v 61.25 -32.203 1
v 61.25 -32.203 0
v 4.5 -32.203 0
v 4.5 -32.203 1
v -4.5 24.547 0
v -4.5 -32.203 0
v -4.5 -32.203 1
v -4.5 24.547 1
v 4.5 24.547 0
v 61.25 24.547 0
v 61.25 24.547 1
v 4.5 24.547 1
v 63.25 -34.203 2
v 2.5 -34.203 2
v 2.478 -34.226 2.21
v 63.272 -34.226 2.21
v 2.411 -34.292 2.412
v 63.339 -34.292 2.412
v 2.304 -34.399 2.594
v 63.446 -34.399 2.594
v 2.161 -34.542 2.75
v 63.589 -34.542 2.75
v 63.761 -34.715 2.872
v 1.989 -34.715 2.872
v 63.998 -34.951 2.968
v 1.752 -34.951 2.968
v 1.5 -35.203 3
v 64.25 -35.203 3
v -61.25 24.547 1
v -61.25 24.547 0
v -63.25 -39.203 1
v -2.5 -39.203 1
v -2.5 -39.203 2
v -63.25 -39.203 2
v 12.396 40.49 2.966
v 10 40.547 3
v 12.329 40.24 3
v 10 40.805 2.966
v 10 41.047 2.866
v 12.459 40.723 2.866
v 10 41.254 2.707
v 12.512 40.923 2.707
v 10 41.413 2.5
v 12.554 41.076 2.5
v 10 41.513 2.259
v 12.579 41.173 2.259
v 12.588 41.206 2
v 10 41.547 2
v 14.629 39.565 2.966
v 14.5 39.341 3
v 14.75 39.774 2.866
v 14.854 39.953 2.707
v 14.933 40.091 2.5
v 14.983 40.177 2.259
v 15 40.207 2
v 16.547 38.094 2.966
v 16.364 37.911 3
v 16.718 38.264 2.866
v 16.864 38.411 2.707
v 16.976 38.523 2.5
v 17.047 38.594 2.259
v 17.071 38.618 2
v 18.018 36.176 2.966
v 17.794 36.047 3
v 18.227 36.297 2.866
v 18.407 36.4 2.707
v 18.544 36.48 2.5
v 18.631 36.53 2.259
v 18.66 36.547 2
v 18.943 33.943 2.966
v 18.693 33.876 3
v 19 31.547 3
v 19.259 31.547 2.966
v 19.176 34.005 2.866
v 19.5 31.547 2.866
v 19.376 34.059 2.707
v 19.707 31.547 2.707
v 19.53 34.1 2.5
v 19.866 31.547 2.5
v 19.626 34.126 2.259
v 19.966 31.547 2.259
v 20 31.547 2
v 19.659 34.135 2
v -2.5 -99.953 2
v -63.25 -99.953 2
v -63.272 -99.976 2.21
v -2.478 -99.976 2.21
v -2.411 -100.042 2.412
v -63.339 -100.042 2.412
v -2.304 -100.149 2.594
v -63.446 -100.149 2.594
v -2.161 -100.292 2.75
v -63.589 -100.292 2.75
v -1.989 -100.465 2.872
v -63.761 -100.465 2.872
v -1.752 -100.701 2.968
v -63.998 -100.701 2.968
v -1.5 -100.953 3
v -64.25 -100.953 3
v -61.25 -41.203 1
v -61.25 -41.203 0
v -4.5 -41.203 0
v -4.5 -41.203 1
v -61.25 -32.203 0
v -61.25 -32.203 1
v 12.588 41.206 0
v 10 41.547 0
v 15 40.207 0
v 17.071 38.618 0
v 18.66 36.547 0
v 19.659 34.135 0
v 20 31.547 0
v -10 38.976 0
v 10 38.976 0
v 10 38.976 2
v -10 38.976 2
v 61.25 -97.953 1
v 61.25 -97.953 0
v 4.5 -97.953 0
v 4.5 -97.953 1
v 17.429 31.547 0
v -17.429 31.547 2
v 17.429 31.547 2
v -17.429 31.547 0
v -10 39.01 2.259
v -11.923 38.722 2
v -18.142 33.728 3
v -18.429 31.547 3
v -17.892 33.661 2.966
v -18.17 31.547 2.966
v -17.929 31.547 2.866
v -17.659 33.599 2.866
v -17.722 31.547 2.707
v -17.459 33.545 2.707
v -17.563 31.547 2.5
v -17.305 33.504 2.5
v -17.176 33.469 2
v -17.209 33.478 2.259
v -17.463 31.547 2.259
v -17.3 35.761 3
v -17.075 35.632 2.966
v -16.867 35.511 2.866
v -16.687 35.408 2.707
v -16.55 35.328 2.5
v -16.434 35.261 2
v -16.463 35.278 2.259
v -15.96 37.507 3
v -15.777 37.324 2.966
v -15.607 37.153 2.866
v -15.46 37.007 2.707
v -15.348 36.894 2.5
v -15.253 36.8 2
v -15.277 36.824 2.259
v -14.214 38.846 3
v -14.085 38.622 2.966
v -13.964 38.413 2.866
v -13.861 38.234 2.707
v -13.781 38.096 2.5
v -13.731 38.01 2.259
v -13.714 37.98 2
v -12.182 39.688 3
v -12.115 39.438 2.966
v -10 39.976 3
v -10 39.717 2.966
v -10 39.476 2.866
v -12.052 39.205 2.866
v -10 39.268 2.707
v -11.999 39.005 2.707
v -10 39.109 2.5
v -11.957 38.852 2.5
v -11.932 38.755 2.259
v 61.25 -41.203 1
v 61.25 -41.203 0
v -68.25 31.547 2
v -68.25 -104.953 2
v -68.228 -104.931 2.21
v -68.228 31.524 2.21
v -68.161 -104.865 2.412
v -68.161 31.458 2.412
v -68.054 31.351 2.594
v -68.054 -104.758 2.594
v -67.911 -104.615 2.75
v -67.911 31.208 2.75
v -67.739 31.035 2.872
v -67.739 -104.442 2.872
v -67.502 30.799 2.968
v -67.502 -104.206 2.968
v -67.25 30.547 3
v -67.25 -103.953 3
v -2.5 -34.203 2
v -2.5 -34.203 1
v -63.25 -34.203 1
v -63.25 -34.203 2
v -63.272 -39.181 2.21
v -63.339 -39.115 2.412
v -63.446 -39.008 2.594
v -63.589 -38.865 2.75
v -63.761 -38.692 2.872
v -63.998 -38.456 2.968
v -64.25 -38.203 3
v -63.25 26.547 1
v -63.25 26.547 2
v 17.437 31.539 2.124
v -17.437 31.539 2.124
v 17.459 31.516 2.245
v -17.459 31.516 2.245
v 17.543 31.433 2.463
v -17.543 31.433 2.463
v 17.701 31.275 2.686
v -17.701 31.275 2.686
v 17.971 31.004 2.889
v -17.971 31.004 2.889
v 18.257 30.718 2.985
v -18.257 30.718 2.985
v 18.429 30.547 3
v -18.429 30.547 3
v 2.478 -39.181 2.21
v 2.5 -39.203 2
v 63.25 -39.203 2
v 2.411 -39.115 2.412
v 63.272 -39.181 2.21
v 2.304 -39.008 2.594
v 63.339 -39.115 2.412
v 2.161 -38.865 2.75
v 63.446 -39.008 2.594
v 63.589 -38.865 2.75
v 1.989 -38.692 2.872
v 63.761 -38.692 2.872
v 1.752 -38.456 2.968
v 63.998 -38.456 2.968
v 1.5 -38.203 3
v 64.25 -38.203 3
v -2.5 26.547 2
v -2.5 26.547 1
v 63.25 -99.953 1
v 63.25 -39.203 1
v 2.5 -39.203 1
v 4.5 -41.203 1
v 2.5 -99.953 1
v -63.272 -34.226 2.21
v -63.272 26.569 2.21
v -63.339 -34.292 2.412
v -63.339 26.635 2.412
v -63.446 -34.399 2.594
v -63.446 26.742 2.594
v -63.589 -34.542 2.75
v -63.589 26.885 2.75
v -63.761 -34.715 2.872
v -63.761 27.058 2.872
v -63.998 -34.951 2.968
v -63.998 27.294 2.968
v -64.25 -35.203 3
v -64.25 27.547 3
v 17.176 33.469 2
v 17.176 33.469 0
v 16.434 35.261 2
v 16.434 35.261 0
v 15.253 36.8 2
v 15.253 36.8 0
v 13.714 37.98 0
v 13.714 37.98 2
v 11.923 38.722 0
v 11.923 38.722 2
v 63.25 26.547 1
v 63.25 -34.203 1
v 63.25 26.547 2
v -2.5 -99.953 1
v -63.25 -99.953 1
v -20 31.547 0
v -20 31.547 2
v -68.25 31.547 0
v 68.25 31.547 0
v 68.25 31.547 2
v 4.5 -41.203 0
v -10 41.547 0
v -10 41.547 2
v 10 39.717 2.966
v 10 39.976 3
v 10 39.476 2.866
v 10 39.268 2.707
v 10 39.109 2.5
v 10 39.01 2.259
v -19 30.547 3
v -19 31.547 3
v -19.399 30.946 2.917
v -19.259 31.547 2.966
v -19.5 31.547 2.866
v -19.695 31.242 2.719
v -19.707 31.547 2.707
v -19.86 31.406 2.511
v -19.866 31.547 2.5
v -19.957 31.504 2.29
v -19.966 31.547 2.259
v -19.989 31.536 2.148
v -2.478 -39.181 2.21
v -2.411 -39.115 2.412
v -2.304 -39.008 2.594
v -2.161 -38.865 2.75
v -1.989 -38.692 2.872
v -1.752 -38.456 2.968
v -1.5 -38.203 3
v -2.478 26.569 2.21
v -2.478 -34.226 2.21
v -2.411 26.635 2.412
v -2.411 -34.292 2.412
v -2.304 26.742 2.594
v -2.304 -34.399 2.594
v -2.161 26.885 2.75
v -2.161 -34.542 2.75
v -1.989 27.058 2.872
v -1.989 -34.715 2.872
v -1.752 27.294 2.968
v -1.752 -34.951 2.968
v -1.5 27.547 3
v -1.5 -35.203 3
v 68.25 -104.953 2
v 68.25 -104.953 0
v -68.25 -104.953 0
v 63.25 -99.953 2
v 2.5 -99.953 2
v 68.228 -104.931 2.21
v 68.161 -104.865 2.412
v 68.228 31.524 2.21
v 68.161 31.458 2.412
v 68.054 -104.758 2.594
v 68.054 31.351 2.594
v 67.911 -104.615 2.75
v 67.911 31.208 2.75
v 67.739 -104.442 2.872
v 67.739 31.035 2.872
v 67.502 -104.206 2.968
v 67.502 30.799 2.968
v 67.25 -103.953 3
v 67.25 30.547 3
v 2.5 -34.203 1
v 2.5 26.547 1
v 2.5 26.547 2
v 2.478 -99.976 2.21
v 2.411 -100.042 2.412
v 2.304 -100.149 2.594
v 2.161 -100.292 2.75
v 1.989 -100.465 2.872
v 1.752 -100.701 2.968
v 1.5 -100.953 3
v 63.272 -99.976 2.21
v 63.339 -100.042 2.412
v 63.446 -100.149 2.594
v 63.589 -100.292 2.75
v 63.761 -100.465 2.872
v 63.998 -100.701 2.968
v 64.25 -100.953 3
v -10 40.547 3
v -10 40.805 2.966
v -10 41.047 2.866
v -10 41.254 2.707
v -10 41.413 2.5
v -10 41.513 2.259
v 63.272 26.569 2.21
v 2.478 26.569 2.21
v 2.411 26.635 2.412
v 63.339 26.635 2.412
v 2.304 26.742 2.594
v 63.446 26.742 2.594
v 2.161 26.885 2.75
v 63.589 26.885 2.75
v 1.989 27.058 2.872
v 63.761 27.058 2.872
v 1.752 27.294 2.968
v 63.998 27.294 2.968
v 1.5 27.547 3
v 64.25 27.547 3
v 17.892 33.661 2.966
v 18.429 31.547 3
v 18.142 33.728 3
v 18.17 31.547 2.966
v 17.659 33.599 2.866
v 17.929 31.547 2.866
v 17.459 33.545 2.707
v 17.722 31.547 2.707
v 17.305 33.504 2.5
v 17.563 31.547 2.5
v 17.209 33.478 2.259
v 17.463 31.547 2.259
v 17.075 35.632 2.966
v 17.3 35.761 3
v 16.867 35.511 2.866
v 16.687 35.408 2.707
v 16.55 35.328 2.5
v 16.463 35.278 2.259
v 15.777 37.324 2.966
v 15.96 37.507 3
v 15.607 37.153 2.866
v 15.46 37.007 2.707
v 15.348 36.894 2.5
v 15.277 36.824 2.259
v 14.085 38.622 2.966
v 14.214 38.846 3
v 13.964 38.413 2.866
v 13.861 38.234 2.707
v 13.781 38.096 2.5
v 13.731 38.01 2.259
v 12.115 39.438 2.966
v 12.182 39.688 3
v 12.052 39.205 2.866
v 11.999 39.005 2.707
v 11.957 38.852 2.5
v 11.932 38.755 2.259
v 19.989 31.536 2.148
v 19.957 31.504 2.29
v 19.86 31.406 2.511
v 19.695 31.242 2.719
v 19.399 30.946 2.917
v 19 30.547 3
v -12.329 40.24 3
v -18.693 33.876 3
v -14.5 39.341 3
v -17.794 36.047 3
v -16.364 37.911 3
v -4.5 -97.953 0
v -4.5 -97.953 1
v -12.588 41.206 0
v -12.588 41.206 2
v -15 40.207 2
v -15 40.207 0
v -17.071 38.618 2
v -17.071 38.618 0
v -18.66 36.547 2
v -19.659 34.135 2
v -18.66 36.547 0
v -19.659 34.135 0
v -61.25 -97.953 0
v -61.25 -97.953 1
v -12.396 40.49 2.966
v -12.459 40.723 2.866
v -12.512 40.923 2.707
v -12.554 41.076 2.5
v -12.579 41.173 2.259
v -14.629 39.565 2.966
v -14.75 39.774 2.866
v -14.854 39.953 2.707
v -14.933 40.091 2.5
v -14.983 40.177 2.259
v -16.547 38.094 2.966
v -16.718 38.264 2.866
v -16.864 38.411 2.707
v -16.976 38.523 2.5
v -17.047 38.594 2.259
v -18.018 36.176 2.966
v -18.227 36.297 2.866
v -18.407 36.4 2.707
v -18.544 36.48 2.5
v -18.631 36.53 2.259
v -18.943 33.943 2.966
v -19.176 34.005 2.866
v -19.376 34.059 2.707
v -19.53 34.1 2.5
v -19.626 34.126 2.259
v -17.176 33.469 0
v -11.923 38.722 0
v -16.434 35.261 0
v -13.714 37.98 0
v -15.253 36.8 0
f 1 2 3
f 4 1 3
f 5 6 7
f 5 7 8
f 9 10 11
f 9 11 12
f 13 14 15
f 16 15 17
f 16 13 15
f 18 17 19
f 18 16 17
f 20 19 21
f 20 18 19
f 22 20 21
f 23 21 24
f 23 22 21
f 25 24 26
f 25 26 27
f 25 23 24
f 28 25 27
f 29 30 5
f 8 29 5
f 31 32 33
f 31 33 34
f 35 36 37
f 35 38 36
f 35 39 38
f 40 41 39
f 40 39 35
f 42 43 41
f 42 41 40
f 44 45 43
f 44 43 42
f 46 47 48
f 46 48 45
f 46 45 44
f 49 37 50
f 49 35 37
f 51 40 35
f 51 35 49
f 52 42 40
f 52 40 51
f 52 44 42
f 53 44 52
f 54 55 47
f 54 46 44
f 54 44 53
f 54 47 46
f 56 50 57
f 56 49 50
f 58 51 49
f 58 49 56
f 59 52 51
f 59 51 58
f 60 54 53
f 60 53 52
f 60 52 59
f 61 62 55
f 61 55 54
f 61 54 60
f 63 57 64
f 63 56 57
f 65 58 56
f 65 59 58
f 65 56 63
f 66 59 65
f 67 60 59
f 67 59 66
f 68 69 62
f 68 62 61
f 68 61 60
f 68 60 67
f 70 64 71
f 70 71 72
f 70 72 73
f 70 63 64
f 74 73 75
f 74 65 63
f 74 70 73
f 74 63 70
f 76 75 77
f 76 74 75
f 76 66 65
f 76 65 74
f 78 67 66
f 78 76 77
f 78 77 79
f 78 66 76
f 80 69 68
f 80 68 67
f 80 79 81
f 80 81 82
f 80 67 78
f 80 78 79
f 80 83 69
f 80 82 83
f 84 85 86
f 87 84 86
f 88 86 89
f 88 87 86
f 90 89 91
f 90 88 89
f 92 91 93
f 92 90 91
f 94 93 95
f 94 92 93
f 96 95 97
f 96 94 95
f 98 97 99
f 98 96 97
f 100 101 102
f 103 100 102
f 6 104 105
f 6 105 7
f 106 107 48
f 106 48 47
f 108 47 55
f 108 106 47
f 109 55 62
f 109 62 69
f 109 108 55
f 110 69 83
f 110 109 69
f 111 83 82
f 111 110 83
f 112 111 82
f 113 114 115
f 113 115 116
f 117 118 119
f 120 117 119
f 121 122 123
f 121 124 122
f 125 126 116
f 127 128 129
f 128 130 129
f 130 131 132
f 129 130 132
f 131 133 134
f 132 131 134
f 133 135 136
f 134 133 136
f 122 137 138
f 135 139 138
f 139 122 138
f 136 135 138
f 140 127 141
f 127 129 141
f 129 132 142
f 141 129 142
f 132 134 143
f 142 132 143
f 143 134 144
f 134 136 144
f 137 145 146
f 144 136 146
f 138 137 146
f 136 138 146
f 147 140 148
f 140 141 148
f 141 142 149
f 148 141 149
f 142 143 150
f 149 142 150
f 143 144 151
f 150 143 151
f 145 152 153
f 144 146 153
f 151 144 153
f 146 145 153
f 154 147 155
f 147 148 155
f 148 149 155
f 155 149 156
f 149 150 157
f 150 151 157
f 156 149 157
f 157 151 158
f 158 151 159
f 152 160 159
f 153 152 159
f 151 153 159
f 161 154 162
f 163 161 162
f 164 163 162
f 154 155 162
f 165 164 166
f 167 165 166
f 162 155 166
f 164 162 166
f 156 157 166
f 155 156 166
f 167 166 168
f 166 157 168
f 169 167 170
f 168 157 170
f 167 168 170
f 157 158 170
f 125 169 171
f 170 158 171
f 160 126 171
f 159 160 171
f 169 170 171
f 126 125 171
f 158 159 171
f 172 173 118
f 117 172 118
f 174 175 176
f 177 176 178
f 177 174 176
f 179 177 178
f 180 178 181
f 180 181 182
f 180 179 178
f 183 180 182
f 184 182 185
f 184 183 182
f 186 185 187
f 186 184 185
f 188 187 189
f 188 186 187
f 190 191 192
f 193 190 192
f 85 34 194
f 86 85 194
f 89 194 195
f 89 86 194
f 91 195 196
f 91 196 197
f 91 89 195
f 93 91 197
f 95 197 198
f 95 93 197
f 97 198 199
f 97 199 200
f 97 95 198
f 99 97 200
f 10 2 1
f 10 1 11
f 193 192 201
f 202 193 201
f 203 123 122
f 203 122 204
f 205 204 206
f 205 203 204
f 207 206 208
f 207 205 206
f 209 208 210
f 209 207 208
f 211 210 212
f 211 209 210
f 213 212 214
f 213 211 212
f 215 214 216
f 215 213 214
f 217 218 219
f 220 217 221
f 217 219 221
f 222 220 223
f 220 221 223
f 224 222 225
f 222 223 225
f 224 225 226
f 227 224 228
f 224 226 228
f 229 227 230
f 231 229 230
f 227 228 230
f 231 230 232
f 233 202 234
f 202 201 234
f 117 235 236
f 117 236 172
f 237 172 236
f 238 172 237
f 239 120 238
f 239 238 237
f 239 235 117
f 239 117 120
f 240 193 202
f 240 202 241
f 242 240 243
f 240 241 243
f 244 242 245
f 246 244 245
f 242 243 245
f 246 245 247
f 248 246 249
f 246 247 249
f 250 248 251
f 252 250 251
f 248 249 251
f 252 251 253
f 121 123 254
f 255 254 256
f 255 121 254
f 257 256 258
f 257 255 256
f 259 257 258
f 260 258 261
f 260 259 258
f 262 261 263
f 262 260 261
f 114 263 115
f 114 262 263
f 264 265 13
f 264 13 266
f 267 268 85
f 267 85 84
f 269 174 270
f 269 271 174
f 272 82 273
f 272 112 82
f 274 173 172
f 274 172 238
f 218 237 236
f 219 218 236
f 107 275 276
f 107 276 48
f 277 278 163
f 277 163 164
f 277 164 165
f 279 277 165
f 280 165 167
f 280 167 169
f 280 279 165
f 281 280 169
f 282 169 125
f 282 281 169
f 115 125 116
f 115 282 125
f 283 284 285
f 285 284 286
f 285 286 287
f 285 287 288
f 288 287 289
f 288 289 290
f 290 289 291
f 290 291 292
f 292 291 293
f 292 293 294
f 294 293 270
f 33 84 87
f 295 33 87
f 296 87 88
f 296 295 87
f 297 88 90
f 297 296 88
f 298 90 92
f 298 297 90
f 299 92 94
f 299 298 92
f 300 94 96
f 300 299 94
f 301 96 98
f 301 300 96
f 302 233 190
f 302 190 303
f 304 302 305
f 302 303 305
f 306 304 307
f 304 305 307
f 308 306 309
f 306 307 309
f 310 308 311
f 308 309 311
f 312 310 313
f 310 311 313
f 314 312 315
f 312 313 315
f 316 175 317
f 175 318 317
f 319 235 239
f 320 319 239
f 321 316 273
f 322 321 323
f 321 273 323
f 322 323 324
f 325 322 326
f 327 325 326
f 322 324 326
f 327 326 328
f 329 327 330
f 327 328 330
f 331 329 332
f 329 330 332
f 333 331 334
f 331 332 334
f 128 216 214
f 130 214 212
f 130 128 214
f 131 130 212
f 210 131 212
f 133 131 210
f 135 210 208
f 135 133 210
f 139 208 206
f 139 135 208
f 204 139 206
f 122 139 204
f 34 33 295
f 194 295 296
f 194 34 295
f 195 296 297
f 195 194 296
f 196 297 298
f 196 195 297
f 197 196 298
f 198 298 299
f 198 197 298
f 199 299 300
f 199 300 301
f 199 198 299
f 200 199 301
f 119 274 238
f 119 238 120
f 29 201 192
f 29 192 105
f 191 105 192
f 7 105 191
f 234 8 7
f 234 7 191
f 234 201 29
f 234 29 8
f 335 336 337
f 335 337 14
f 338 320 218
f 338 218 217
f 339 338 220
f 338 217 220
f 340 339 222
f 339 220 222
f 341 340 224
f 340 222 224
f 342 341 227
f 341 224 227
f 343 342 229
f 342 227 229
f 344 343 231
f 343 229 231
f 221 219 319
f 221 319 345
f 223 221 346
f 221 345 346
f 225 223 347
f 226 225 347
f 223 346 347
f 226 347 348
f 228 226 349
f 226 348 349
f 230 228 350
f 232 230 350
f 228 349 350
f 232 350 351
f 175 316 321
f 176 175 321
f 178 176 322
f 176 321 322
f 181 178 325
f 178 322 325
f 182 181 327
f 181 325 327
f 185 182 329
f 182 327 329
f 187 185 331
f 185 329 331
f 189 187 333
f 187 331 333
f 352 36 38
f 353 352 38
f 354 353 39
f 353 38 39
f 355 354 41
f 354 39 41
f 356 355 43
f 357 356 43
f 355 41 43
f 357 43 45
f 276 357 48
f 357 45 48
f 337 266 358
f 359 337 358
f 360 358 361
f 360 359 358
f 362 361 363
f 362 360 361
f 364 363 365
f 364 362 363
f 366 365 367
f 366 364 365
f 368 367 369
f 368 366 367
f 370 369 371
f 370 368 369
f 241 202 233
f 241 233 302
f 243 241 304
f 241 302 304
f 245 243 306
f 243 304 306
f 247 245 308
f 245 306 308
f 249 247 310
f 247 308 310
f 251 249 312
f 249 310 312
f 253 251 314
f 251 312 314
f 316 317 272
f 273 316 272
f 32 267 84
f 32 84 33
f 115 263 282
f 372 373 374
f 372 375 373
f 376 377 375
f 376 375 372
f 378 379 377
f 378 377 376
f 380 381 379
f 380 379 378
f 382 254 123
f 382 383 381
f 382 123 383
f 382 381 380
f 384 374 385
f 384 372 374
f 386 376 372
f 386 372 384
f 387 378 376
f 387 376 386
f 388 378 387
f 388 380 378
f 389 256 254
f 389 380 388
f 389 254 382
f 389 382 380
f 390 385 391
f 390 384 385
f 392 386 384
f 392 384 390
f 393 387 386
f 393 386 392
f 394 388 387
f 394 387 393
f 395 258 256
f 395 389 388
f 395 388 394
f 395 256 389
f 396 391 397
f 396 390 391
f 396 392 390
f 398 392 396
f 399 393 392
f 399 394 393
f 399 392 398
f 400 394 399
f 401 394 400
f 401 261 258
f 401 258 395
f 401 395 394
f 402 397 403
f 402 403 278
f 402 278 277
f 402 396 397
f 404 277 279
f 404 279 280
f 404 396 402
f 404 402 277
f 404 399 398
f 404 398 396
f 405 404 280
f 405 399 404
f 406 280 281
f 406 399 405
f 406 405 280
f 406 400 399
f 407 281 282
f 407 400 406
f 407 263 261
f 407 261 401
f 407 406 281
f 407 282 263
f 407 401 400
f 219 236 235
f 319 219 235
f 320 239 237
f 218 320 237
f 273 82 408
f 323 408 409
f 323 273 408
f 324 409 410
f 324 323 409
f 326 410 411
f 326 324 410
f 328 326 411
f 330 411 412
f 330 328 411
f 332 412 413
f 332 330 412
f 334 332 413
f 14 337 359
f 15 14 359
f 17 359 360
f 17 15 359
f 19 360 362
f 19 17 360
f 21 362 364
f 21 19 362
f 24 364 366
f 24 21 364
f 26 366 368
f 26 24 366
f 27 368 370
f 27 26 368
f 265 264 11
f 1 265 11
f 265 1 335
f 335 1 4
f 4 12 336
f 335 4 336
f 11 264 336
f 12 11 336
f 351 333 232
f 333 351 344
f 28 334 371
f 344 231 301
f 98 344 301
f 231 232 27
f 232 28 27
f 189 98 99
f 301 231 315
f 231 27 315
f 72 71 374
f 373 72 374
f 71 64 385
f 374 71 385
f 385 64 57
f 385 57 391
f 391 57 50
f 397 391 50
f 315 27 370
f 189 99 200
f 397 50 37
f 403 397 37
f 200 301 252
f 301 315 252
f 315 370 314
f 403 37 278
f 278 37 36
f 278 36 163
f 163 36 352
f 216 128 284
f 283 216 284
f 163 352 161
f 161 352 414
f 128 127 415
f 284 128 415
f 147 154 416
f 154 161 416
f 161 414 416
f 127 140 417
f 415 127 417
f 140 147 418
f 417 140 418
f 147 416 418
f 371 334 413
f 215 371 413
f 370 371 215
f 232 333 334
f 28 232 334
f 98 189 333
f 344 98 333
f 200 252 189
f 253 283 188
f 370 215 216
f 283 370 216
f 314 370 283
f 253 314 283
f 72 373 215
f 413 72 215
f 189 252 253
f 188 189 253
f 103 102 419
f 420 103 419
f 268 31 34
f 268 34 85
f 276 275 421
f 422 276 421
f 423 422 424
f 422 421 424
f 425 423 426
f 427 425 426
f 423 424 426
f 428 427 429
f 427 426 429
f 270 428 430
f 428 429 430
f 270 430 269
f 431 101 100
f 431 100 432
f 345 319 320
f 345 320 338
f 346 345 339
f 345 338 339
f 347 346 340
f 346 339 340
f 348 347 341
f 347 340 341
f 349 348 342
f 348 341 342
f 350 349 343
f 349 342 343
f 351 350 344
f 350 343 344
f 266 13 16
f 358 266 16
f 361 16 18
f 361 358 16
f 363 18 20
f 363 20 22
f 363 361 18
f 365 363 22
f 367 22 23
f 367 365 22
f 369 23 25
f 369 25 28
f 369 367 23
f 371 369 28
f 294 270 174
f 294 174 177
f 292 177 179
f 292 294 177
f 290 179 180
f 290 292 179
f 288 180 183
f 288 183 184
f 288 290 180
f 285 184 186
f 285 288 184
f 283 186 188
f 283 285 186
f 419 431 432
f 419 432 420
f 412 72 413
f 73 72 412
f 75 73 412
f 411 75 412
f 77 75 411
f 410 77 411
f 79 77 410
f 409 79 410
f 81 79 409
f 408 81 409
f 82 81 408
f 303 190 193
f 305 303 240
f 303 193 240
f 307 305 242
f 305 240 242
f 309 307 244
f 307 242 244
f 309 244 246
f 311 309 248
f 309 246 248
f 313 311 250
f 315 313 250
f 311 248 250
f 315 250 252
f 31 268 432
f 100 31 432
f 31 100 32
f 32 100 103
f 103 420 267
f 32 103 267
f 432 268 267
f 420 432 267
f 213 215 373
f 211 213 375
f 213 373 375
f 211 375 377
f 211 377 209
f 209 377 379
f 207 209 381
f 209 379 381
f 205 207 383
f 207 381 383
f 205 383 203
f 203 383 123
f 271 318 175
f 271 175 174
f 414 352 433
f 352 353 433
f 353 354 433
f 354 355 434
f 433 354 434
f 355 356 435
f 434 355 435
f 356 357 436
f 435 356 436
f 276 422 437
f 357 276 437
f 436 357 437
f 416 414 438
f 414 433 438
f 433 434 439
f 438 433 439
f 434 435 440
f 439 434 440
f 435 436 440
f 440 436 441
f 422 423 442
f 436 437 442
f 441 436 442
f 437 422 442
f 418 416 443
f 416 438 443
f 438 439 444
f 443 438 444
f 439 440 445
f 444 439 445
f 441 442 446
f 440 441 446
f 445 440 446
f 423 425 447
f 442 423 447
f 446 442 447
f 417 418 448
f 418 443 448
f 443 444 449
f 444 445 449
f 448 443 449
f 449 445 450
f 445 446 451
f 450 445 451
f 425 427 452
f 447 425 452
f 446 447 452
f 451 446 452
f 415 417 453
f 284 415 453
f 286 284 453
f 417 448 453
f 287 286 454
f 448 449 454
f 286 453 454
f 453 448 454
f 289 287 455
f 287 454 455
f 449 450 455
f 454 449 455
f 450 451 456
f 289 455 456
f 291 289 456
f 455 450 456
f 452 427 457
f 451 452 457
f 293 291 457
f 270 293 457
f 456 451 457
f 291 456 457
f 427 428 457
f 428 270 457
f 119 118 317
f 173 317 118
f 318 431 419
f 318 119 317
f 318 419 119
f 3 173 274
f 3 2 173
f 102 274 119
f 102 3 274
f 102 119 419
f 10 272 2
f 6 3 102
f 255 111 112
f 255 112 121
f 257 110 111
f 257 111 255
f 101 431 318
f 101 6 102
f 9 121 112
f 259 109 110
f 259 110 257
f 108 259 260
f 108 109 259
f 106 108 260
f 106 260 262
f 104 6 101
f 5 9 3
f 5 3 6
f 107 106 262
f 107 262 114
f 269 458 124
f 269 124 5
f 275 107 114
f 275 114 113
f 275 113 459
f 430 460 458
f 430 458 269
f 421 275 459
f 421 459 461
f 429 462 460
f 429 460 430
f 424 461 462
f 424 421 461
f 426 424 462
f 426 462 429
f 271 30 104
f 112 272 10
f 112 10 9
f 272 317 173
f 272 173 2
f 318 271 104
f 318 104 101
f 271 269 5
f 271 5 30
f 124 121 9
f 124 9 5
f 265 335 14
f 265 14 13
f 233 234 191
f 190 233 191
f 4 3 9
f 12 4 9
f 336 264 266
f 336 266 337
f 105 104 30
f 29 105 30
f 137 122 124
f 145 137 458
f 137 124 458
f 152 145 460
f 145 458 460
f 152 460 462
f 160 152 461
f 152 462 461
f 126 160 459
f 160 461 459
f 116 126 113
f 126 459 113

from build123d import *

# Parameters (mm, degrees)
F0_W         = 2.5711264648
F0_H         = 5
F1_DEPTH     = 3
F0_W_2       = 56.75
F0_H_2       = 56.75
F2_DEPTH     = 1
F3_R         = 1
F6_DEPTH     = 3
F7_T1_DEPTH  = 12.5
F7_T3_DEPTH  = 7.5711264648
F7_T5_DEPTH  = 3.5
F7_T8_ANGLE  = 90
F7_T10_ANGLE = 90


# Not quite as in the source:
# - a fillet or chamfer that OpenCascade refuses, or shapes differently, is made with other operations: its cross-section is extruded or revolved along the edge and cut away or added
# - a feature names something its author has since deleted; it is built from what else it names


with BuildPart() as f1:
    # F0 (on Top) → F1 (new body)
    with BuildSketch(Plane.XY):
        Polygon((-63.25, -34.2033516131), (-63.25, 26.5466483869), (-20, 26.5466483869), (-20, 31.5466483869), (-34.125, 31.5466483869), (-68.25, 31.5466483869), (-68.25, -36.7033516131), (0, -36.7033516131), (0, 31.5466483869), (-17.4288735352, 31.5466483869), (-17.4288735352, 26.5466483869), (-2.5, 26.5466483869), (-2.5, -34.2033516131), align=None)
        with Locations((-18.7144367676, 29.0466483869)):
            Rectangle(F0_W, F0_H)
    extrude(amount=F1_DEPTH)

    # F0 (on Top) → F2 (join)
    with BuildSketch(Plane.XY):
        Polygon((-20, 26.5466483869), (-63.25, 26.5466483869), (-63.25, -34.2033516131), (-2.5, -34.2033516131), (-2.5, 26.5466483869), (-17.4288735352, 26.5466483869), align=None)
        with Locations((-32.875, -3.8283516131)):
            Rectangle(F0_W_2, F0_H_2, mode=Mode.SUBTRACT)
    extrude(amount=F2_DEPTH)

    # F3
    f3_edges = [f1.edges().sort_by_distance(p)[0] for p in [
        (-32.875, 26.546648, 3),
        (-63.25, -3.828352, 3),
        (-32.875, -34.203352, 3),
        (-2.5, -3.828352, 3),
        (-34.125, 31.546648, 3),
        (-68.25, -2.578352, 3),
    ]]
    fillet(f3_edges, radius=F3_R)

    # F4: F1 across plane


with BuildPart() as f1_1:
    add(f1.part)
    add(f1.part.mirror(Plane.YZ))

    # F5: F1 across face


with BuildPart() as f1_2:
    add(f1_1.part)
    add(f1_1.part.mirror(Plane(origin=(0, -36.7033516131, 1.4986605371), x_dir=(1, 0, 0), z_dir=(0, -1, 0))))

    # F0 (on Top) → F6 (join)
    with BuildSketch(Plane.XY):
        with BuildLine():
            ThreePointArc((-10, 41.5466483869), (-17.0710678119, 38.6177161988), (-20, 31.5466483869))
            Line((-20, 31.5466483869), (-17.4288735352, 31.5466483869))
            ThreePointArc((-17.4288735352, 31.5466483869), (-15.2530068533, 36.7996552402), (-10, 38.9755219221))
            Line((-10, 38.9755219221), (0, 38.9755219221))
            Line((0, 38.9755219221), (0, 41.5466483869))
            Line((0, 41.5466483869), (-10, 41.5466483869))
        make_face()
        with Locations((-18.7144367676, 29.0466483869)):
            Rectangle(F0_W, F0_H)
    extrude(amount=F6_DEPTH)

    # F7: fillet of radius 1 on 4 edges, made by hand

    # F7_s2 → F7_t1 (cut)
    with BuildSketch(Plane.YZ.offset(-10)):
        with BuildLine():
            ThreePointArc((39.9755219221, 3), (39.2684151409, 2.7071067812), (38.9755219221, 2))
            Line((38.9755219221, 2), (38.9755219221, 3))
            Line((38.9755219221, 3), (39.9755219221, 3))
        make_face()
        with BuildLine():
            ThreePointArc((40.5466483869, 3), (41.2537551681, 2.7071067812), (41.5466483869, 2))
            Line((41.5466483869, 2), (41.5466483869, 3))
            Line((41.5466483869, 3), (40.5466483869, 3))
        make_face()
    extrude(amount=F7_T1_DEPTH, mode=Mode.SUBTRACT)

    # F7_s4 → F7_t3 (cut)
    with BuildSketch(Plane.YZ.offset(-22.5)):
        with BuildLine():
            ThreePointArc((27.5466483869, 3), (26.8395416057, 2.7071067812), (26.5466483869, 2))
            Line((26.5466483869, 2), (26.5466483869, 3))
            Line((26.5466483869, 3), (27.5466483869, 3))
        make_face()
    extrude(amount=F7_T3_DEPTH, mode=Mode.SUBTRACT)

    # F7_s6 → F7_t5 (cut)
    with BuildSketch(Plane.XZ.offset(-31.5466483869)):
        with BuildLine():
            ThreePointArc((-19, 3), (-19.7071067812, 2.7071067812), (-20, 2))
            Line((-20, 2), (-20, 3))
            Line((-20, 3), (-19, 3))
        make_face()
        with BuildLine():
            ThreePointArc((-18.4288735352, 3), (-17.721766754, 2.7071067812), (-17.4288735352, 2))
            Line((-17.4288735352, 2), (-17.4288735352, 3))
            Line((-17.4288735352, 3), (-18.4288735352, 3))
        make_face()
    extrude(amount=F7_T5_DEPTH, mode=Mode.SUBTRACT)

    # F7_s7 → F7_t8 (revolve, cut)
    with BuildSketch(Plane.XZ.offset(-31.5466483869)):
        with BuildLine():
            ThreePointArc((-18.4288735352, 3), (-17.721766754, 2.7071067812), (-17.4288735352, 2))
            Line((-17.4288735352, 2), (-17.4288735352, 3))
            Line((-17.4288735352, 3), (-18.4288735352, 3))
        make_face()
    revolve(axis=Axis((-10, 31.5466483869, 3), (0, 0, -1)), revolution_arc=F7_T8_ANGLE, mode=Mode.SUBTRACT)

    # F7_s9 → F7_t10 (revolve, cut)
    with BuildSketch(Plane.YZ.offset(-10)):
        with BuildLine():
            ThreePointArc((40.5466483869, 3), (41.2537551681, 2.7071067812), (41.5466483869, 2))
            Line((41.5466483869, 2), (41.5466483869, 3))
            Line((41.5466483869, 3), (40.5466483869, 3))
        make_face()
    revolve(axis=Axis((-10, 31.5466483869, 3), (0, 0, 1)), revolution_arc=F7_T10_ANGLE, mode=Mode.SUBTRACT)

    # F8: F1 across plane


with BuildPart() as f1_3:
    add(f1_2.part)
    add(f1_2.part.mirror(Plane.YZ))


solid = f1_3.part
